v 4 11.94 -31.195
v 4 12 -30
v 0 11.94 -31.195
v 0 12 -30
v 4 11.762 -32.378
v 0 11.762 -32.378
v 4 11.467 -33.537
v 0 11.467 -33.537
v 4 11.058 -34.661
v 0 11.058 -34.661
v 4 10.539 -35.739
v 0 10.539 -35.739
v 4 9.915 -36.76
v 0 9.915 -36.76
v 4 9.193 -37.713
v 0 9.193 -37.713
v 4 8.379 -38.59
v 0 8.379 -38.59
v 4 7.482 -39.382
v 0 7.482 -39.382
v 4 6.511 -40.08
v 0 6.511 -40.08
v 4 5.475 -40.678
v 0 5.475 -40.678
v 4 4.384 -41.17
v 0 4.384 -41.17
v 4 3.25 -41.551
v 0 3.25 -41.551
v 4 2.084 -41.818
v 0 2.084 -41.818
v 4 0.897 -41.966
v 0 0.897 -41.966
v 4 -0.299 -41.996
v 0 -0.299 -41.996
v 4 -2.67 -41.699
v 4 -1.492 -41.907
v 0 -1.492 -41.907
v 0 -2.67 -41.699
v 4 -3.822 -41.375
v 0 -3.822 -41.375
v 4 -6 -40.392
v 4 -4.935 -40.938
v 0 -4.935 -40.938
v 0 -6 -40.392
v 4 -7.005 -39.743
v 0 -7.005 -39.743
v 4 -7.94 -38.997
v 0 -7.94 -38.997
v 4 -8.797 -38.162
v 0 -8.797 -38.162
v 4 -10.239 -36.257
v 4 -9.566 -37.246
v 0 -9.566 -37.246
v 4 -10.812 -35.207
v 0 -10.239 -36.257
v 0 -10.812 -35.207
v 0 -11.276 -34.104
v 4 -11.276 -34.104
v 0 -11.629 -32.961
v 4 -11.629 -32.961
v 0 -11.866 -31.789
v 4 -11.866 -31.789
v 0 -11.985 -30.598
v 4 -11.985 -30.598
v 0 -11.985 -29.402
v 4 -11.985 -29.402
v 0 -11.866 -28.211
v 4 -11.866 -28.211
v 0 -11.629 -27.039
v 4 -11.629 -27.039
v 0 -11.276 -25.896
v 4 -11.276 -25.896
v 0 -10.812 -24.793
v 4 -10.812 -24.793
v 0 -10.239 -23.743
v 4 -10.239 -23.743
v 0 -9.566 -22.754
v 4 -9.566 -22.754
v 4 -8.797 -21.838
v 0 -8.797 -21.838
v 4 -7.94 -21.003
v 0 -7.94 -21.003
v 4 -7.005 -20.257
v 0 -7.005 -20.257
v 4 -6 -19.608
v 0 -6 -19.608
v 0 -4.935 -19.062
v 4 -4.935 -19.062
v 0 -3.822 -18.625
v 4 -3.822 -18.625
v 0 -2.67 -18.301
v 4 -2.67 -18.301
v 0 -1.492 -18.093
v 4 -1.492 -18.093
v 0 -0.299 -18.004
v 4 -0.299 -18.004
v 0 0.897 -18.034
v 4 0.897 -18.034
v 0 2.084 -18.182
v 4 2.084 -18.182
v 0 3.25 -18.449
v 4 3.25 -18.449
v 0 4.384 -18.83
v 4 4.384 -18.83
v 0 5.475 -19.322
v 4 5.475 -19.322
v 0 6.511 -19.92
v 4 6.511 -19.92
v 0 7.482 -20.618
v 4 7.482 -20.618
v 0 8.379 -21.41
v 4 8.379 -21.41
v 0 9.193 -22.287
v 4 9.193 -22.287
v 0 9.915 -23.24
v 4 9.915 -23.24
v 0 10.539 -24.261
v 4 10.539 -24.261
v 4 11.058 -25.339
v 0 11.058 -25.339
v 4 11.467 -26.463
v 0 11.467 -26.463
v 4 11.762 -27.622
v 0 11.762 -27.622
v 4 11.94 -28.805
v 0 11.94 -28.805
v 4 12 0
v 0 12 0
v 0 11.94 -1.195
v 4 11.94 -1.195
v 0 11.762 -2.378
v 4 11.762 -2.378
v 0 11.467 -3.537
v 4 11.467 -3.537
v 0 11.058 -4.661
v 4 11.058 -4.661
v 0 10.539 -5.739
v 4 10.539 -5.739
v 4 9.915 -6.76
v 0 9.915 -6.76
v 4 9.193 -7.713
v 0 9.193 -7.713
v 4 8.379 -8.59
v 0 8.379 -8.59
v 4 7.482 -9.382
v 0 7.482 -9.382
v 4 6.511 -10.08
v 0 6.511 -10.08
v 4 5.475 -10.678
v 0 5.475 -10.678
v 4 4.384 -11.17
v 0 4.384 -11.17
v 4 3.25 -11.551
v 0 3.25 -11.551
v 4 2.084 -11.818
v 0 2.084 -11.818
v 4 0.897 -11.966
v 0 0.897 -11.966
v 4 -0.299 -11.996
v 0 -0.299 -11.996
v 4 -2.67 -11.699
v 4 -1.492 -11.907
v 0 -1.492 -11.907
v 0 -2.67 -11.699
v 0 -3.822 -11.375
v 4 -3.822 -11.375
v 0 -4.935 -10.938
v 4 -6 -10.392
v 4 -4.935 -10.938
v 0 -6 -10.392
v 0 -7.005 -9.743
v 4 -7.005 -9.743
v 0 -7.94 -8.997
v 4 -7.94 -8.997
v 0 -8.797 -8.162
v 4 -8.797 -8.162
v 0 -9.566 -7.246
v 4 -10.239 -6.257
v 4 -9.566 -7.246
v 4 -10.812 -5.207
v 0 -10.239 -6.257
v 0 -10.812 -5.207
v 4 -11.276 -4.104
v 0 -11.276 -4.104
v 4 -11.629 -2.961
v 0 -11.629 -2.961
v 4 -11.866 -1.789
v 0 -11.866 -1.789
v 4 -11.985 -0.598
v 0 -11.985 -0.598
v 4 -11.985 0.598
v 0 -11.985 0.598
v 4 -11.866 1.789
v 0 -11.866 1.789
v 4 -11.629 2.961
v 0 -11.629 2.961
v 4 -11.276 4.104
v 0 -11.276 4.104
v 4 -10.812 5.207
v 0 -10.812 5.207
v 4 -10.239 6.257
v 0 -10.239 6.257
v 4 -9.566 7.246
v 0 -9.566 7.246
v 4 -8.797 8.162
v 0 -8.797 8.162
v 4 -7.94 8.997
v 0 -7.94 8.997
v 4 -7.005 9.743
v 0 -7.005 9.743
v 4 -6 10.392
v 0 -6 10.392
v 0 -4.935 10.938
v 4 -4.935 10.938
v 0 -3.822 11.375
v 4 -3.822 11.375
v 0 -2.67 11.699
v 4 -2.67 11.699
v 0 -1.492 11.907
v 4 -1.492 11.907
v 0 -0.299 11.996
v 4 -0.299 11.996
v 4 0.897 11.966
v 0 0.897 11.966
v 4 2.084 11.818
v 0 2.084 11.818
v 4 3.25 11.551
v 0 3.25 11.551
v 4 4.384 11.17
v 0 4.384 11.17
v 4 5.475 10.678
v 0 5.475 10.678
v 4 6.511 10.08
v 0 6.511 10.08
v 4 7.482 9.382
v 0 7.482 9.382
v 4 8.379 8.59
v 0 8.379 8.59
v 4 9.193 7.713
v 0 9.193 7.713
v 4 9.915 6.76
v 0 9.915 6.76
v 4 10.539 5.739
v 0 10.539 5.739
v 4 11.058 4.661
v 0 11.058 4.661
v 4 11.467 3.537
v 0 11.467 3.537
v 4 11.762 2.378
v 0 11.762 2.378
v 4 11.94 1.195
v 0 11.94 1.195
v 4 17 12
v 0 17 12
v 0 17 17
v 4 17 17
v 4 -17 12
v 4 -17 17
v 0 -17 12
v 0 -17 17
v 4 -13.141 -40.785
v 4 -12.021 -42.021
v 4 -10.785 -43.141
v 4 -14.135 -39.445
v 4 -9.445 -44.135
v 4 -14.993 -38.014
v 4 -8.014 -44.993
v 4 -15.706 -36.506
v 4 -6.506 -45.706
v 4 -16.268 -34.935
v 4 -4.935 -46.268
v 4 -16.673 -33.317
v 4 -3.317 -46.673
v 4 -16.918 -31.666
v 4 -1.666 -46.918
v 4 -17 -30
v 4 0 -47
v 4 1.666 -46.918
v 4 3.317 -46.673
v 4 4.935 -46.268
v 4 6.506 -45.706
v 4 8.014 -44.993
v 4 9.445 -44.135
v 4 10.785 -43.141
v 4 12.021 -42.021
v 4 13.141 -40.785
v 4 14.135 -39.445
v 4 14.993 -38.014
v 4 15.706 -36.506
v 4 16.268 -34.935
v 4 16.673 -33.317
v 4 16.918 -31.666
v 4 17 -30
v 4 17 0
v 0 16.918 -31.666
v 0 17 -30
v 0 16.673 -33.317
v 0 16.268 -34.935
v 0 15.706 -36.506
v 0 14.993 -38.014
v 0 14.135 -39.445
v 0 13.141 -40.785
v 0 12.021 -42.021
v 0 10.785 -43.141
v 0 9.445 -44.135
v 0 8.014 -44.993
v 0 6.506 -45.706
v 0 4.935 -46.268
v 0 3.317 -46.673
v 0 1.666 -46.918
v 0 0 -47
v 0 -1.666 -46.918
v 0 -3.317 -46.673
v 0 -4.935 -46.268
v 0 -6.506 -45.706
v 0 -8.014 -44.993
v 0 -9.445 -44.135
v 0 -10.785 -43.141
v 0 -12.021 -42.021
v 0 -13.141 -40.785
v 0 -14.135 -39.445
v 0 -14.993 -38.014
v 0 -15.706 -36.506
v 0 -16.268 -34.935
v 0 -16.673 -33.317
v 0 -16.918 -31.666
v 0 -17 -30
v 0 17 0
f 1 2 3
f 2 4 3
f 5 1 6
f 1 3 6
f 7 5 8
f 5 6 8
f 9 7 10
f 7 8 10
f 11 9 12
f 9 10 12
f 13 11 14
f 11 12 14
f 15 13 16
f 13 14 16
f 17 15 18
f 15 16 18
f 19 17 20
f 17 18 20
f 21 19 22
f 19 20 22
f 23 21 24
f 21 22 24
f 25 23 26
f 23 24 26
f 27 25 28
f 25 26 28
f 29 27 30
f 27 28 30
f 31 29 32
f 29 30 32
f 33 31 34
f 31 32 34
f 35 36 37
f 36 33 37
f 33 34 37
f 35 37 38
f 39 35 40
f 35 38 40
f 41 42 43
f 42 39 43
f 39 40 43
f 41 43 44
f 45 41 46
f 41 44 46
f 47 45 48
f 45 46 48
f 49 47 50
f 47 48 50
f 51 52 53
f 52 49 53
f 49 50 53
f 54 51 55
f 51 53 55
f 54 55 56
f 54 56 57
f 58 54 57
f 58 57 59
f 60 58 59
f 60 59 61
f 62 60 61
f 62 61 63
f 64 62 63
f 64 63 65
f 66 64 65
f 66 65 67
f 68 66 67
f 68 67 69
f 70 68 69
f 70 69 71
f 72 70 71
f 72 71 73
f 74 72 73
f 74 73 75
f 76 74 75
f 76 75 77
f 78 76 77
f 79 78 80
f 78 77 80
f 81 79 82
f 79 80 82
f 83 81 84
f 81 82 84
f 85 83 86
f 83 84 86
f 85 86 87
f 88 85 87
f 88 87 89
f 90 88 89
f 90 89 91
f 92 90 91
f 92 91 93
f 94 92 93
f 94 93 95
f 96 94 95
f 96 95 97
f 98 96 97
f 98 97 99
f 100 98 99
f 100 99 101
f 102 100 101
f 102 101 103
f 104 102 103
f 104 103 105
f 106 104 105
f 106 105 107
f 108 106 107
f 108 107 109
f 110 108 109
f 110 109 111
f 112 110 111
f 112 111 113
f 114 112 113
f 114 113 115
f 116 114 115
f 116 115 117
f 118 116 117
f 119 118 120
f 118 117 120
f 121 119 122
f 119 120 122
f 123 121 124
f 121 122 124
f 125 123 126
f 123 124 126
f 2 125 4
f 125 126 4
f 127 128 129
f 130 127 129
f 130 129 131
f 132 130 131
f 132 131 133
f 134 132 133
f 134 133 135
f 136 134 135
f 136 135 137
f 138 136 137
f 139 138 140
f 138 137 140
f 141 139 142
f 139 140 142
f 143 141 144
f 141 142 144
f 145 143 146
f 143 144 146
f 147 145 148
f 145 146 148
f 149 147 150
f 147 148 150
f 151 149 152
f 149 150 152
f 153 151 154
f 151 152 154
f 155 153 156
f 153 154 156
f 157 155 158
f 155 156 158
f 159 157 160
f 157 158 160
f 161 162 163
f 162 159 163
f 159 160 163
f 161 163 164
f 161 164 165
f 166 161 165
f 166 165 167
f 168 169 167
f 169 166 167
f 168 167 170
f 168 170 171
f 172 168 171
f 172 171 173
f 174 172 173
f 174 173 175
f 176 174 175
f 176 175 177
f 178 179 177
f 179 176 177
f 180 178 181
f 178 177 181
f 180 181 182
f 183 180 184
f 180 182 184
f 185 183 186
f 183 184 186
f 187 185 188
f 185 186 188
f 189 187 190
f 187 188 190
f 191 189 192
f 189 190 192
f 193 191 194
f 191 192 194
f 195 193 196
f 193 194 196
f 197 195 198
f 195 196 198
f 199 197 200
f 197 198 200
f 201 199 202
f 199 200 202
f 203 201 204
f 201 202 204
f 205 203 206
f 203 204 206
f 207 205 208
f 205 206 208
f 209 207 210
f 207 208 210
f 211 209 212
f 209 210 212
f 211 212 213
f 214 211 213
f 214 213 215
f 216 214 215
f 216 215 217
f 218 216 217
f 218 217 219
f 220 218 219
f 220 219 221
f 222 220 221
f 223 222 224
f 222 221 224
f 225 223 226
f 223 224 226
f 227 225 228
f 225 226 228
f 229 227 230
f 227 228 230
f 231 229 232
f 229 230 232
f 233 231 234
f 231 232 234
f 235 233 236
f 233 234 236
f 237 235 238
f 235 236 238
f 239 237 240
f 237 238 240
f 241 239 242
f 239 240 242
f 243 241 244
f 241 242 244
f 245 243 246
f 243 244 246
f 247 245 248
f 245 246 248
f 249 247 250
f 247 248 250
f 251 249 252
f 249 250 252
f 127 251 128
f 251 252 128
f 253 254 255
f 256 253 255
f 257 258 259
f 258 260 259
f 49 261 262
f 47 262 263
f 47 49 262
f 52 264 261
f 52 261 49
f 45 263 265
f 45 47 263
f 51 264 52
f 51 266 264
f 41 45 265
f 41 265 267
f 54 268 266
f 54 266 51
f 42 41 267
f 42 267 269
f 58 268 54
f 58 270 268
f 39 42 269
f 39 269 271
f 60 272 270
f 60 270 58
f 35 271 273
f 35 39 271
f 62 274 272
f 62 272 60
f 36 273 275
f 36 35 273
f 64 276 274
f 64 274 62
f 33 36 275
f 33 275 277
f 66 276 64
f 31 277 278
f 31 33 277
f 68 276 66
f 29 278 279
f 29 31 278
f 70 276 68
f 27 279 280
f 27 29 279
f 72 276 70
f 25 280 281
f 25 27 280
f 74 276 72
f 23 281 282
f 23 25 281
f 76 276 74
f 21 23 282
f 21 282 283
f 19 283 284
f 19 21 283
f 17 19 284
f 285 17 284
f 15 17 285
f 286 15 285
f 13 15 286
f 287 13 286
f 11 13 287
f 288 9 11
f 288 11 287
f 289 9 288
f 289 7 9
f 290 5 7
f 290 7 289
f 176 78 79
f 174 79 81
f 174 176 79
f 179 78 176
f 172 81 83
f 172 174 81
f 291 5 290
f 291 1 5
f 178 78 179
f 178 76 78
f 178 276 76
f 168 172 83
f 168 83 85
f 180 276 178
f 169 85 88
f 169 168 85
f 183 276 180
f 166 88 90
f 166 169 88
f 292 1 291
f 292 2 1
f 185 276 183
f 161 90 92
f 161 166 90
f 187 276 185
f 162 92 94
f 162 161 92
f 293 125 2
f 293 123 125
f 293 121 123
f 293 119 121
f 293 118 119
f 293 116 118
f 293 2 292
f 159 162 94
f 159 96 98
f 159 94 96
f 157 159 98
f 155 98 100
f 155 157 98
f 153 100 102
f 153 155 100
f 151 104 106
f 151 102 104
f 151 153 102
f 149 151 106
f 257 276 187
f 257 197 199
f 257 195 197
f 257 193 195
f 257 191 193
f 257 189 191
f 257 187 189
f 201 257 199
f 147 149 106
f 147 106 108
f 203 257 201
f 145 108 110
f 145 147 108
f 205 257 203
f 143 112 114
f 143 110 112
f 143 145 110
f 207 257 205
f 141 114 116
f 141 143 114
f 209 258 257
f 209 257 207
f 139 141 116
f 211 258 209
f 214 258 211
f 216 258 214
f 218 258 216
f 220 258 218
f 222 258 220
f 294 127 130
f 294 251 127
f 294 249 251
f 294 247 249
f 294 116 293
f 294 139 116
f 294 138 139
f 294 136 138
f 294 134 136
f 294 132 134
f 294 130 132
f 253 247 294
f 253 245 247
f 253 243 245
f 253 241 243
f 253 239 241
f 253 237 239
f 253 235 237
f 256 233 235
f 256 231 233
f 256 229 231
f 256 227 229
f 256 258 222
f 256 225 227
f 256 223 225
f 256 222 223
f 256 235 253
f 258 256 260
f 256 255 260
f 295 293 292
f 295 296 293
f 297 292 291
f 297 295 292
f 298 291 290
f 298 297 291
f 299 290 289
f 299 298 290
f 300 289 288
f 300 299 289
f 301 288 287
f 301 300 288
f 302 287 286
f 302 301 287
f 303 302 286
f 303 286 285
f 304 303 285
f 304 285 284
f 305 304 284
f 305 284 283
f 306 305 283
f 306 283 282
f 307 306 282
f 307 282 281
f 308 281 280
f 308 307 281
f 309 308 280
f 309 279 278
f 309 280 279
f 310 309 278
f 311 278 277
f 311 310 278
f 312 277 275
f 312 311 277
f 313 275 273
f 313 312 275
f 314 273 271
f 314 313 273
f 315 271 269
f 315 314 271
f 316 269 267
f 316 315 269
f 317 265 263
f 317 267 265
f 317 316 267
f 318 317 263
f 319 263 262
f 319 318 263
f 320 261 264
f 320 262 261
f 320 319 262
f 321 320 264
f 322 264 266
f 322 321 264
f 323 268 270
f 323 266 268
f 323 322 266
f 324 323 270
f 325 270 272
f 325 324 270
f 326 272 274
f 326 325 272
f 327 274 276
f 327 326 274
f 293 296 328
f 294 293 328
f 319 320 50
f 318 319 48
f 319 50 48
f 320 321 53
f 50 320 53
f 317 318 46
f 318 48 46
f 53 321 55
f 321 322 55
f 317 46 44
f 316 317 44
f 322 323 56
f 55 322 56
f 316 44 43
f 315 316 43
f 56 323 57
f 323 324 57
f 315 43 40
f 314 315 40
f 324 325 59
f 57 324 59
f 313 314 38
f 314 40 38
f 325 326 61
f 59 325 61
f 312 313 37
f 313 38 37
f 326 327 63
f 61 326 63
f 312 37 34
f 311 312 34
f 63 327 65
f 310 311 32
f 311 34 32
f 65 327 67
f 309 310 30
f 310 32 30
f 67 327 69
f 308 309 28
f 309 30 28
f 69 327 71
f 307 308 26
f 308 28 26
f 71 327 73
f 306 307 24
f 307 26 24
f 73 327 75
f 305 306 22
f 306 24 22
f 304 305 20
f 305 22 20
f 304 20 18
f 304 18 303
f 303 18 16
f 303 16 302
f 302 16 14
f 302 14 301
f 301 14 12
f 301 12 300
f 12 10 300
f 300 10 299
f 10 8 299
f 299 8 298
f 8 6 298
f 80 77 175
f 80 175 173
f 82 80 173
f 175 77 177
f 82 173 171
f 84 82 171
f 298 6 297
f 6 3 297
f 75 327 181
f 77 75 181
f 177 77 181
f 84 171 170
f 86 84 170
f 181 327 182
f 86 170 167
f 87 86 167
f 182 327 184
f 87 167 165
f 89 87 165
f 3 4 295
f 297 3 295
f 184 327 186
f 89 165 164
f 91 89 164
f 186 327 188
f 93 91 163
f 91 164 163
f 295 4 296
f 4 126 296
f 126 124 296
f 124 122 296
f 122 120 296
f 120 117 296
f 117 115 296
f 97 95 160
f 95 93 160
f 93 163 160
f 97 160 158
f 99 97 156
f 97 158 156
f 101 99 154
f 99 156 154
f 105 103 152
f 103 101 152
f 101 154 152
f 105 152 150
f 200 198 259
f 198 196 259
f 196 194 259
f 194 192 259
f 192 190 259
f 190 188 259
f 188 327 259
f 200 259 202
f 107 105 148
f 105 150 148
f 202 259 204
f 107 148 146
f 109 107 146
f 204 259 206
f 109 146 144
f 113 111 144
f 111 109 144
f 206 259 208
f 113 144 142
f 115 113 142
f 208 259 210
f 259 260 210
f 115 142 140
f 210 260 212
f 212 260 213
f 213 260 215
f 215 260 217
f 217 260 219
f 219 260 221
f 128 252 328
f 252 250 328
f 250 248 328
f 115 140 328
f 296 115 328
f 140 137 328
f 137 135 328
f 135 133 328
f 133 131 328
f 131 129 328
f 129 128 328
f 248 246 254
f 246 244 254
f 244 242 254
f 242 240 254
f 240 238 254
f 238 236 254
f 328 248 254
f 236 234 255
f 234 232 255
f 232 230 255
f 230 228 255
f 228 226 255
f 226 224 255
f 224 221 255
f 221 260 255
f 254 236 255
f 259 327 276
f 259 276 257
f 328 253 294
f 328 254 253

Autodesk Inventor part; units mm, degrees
ref_plane "YZ Plane" through (0, 0, 0) normal (1, 0, 0) x (0, 1, 0)
ref_plane "XZ Plane" through (0, 0, 0) normal (0, 1, 0) x (-1, 0, 0)
ref_plane "XY Plane" through (0, 0, 0) normal (0, 0, 1) x (1, 0, 0)
sketch "Sketch1" plane through (0, 0, 0) normal (1, 0, 0) x (0, 1, 0)
  circle A0 centre (0, 0) radius 12
  circle A1 centre (0, -30) radius 12
  line L0 (17, -30) -> (17, 0)
  arc A2 (-17, -30) -> (17, -30) centre (0, -30) ccw
  line L1 (-17, -30) -> (-17, 12)
  line L2 (17, 12) -> (17, 0)
  line L3 (17, 12) -> (17, 17)
  line L4 (17, 17) -> (-17, 17)
  line L5 (-17, 17) -> (-17, 12)
extrude "Extrusion1" add sketch "Sketch1" along normal blind 4
properties part number "lamp_holder_front"
